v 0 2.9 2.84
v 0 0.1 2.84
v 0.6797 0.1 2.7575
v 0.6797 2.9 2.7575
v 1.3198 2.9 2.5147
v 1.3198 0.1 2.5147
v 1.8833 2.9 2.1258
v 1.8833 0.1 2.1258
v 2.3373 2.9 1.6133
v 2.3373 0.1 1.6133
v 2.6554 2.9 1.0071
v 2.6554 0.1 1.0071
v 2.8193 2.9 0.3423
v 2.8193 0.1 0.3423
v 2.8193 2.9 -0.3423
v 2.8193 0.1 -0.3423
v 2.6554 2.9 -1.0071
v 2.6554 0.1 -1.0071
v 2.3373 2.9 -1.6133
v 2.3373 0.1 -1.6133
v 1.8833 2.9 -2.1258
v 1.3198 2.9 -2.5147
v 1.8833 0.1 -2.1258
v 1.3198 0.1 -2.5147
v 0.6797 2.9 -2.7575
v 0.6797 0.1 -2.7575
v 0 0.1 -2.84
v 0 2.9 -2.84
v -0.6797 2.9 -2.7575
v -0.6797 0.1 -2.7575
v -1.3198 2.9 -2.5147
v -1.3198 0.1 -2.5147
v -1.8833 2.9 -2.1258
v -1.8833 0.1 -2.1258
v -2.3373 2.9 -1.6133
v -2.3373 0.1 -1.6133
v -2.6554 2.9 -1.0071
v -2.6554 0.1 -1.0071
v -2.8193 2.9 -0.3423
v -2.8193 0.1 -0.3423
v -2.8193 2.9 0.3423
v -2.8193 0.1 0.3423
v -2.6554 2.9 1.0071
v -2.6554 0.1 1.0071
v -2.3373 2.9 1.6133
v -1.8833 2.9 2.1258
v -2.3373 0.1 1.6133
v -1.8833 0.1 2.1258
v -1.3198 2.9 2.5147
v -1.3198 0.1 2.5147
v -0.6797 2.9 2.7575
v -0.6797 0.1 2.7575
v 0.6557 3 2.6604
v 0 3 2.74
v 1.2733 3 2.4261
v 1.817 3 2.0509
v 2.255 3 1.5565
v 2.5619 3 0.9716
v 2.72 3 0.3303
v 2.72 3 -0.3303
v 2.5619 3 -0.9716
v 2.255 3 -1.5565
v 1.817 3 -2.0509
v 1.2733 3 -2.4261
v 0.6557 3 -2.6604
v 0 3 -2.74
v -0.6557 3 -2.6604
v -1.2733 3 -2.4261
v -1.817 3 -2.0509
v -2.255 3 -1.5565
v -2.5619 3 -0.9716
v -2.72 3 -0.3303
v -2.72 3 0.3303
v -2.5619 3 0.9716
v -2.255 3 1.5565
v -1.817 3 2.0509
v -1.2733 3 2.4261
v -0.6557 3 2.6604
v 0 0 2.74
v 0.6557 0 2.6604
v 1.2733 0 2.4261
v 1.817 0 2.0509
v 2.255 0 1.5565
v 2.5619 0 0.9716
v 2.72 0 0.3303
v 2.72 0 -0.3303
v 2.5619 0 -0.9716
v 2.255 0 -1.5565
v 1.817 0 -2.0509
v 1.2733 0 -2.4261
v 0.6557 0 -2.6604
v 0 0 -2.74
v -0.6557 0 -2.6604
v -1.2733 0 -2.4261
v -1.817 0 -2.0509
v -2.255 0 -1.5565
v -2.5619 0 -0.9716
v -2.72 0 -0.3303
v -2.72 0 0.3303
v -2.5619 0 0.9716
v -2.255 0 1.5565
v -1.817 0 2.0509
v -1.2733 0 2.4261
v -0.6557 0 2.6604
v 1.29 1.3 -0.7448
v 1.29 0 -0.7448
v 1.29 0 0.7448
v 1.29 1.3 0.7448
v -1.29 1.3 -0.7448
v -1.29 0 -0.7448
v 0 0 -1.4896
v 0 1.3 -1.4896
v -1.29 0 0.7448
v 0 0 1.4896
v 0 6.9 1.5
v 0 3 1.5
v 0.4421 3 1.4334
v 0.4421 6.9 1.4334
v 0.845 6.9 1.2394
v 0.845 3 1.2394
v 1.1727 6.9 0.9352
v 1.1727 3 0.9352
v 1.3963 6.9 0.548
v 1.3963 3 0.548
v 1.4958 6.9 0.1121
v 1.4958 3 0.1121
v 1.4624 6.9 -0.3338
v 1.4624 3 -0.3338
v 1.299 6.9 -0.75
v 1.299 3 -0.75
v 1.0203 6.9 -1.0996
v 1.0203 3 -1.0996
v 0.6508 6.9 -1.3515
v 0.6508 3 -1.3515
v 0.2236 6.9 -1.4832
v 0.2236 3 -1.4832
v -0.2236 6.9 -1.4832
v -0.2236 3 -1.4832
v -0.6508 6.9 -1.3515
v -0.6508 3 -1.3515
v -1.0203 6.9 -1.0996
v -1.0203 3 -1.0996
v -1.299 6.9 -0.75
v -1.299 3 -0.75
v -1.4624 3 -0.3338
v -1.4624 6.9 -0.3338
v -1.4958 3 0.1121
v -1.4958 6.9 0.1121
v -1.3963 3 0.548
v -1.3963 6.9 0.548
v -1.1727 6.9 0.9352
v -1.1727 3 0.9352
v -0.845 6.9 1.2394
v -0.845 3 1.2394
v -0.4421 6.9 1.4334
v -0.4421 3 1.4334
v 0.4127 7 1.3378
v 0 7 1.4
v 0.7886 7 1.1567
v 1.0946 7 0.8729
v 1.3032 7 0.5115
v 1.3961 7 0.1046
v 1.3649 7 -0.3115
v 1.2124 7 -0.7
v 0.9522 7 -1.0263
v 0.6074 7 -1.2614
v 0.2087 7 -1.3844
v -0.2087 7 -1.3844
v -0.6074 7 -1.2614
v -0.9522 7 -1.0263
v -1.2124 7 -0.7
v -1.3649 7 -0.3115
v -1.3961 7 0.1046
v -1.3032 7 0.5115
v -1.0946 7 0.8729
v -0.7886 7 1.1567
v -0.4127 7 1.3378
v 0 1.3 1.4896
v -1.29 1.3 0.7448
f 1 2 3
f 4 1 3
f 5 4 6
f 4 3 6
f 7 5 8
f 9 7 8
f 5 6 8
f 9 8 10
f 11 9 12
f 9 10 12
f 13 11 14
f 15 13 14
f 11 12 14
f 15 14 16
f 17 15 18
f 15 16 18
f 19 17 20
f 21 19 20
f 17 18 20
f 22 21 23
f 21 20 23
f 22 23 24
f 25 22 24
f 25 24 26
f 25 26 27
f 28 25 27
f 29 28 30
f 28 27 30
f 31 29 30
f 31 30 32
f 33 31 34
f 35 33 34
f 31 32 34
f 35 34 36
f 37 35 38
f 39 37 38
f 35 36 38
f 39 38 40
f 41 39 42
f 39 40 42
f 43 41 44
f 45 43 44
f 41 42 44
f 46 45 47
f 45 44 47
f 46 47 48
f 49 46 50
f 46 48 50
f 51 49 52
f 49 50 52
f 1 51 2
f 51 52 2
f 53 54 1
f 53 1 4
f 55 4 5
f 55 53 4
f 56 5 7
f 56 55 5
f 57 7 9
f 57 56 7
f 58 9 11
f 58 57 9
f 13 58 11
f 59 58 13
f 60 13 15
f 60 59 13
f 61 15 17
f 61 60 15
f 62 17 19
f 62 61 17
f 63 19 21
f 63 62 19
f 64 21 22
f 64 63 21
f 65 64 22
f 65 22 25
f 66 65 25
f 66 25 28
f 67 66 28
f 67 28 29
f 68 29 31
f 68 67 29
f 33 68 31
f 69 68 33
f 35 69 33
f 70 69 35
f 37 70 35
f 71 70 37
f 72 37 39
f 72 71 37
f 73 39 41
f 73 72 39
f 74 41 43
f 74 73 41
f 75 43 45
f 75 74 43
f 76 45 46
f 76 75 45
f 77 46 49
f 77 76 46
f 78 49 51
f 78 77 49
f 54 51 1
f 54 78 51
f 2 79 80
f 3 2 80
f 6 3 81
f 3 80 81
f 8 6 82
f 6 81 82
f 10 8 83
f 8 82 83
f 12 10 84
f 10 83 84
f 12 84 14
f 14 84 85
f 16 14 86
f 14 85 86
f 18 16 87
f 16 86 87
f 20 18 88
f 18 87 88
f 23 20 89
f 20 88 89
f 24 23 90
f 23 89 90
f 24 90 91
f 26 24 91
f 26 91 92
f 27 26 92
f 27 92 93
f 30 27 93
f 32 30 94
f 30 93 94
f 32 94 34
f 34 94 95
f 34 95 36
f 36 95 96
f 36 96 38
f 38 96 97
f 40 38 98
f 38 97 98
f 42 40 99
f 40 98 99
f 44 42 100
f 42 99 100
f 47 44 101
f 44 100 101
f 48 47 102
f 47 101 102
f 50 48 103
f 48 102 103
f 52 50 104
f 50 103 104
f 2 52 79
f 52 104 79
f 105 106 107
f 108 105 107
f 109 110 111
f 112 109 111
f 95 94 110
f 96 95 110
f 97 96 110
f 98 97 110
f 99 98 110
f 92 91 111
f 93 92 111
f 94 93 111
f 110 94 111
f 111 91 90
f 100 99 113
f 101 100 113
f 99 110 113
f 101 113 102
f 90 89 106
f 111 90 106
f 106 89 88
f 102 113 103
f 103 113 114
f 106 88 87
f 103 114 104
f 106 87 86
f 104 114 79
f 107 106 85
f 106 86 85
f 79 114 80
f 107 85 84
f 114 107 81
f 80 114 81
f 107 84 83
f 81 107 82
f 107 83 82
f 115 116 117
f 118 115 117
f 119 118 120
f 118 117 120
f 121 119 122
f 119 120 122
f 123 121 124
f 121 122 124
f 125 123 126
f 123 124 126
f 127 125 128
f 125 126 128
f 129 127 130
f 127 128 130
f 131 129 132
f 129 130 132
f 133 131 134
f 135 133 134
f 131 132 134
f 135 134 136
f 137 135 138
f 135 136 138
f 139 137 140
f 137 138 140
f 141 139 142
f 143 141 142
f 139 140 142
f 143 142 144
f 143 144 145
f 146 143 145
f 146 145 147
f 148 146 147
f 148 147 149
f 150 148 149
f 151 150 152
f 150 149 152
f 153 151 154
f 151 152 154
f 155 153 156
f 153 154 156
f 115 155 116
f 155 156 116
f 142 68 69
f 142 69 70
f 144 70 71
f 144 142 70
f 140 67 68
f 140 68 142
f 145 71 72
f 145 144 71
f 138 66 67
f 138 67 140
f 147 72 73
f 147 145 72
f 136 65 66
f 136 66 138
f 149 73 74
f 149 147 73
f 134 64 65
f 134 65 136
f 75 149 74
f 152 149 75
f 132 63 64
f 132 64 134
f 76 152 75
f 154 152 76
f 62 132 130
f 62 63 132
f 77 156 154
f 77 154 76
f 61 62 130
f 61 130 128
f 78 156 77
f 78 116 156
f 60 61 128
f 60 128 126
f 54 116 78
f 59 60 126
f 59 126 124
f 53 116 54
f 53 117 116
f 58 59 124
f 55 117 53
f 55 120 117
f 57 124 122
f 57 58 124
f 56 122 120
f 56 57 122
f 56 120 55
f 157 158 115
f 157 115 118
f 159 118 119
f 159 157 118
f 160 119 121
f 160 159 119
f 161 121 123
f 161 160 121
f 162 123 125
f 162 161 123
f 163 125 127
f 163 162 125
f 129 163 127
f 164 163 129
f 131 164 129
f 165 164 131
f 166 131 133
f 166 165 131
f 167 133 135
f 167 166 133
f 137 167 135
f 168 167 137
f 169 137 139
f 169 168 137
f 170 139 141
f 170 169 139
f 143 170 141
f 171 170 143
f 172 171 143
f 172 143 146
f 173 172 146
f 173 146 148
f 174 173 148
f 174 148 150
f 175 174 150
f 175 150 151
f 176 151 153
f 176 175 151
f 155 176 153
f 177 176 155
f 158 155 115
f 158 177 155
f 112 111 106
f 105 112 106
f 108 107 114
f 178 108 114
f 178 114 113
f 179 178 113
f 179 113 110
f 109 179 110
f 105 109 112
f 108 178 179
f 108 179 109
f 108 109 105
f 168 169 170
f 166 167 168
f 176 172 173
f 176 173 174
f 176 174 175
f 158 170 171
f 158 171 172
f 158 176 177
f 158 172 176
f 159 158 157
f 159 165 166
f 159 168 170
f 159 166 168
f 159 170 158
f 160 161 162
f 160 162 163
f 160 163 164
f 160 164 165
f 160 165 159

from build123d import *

# Parameters (mm, degrees)
SKETCH_1_R            = 2.84
EXTRUDE_261_DEPTH     = 3
SKETCH_2_R            = 1.5
EXTRUDE_345_DEPTH     = 4
CUT_EXTRUDE_529_DEPTH = 1.3
CHAMFER_591_SIZE      = 0.1


with BuildPart() as part:
    # 草图1 → Extrude 261 (new body)
    with BuildSketch(Plane(origin=(0, 0, 0), x_dir=(1, 0, 0), z_dir=(0, 1, 0))):
        with Locations(Location((0, 0, 0), (0, 0, 270))):
            Circle(SKETCH_1_R)
    extrude(amount=EXTRUDE_261_DEPTH)

    # 草图2 → Extrude 345 (add)
    with BuildSketch(Plane(origin=(0, 3, 0), x_dir=(1, 0, 0), z_dir=(0, 1, 0))):
        with Locations(Location((0, 0, 0), (0, 0, 270))):
            Circle(SKETCH_2_R)
    extrude(amount=EXTRUDE_345_DEPTH)

    # 草图3 → Cut-Extrude 529 (cut)
    with BuildSketch(Plane.XZ):
        Polygon((1.29, -0.744781847), (1.29, 0.744781847), (0, 1.489563695), (-1.29, 0.744781847), (-1.29, -0.744781847), (0, -1.489563695), align=None)
    extrude(amount=-CUT_EXTRUDE_529_DEPTH, mode=Mode.SUBTRACT)

    # Chamfer 591
    chamfer_591_edges = [part.edges().sort_by_distance(p)[0] for p in [
        (0, 0, -2.84),
        (0, 3, -2.84),
        (0, 7, -1.5),
    ]]
    chamfer(chamfer_591_edges, length=CHAMFER_591_SIZE)


solid = part.part
